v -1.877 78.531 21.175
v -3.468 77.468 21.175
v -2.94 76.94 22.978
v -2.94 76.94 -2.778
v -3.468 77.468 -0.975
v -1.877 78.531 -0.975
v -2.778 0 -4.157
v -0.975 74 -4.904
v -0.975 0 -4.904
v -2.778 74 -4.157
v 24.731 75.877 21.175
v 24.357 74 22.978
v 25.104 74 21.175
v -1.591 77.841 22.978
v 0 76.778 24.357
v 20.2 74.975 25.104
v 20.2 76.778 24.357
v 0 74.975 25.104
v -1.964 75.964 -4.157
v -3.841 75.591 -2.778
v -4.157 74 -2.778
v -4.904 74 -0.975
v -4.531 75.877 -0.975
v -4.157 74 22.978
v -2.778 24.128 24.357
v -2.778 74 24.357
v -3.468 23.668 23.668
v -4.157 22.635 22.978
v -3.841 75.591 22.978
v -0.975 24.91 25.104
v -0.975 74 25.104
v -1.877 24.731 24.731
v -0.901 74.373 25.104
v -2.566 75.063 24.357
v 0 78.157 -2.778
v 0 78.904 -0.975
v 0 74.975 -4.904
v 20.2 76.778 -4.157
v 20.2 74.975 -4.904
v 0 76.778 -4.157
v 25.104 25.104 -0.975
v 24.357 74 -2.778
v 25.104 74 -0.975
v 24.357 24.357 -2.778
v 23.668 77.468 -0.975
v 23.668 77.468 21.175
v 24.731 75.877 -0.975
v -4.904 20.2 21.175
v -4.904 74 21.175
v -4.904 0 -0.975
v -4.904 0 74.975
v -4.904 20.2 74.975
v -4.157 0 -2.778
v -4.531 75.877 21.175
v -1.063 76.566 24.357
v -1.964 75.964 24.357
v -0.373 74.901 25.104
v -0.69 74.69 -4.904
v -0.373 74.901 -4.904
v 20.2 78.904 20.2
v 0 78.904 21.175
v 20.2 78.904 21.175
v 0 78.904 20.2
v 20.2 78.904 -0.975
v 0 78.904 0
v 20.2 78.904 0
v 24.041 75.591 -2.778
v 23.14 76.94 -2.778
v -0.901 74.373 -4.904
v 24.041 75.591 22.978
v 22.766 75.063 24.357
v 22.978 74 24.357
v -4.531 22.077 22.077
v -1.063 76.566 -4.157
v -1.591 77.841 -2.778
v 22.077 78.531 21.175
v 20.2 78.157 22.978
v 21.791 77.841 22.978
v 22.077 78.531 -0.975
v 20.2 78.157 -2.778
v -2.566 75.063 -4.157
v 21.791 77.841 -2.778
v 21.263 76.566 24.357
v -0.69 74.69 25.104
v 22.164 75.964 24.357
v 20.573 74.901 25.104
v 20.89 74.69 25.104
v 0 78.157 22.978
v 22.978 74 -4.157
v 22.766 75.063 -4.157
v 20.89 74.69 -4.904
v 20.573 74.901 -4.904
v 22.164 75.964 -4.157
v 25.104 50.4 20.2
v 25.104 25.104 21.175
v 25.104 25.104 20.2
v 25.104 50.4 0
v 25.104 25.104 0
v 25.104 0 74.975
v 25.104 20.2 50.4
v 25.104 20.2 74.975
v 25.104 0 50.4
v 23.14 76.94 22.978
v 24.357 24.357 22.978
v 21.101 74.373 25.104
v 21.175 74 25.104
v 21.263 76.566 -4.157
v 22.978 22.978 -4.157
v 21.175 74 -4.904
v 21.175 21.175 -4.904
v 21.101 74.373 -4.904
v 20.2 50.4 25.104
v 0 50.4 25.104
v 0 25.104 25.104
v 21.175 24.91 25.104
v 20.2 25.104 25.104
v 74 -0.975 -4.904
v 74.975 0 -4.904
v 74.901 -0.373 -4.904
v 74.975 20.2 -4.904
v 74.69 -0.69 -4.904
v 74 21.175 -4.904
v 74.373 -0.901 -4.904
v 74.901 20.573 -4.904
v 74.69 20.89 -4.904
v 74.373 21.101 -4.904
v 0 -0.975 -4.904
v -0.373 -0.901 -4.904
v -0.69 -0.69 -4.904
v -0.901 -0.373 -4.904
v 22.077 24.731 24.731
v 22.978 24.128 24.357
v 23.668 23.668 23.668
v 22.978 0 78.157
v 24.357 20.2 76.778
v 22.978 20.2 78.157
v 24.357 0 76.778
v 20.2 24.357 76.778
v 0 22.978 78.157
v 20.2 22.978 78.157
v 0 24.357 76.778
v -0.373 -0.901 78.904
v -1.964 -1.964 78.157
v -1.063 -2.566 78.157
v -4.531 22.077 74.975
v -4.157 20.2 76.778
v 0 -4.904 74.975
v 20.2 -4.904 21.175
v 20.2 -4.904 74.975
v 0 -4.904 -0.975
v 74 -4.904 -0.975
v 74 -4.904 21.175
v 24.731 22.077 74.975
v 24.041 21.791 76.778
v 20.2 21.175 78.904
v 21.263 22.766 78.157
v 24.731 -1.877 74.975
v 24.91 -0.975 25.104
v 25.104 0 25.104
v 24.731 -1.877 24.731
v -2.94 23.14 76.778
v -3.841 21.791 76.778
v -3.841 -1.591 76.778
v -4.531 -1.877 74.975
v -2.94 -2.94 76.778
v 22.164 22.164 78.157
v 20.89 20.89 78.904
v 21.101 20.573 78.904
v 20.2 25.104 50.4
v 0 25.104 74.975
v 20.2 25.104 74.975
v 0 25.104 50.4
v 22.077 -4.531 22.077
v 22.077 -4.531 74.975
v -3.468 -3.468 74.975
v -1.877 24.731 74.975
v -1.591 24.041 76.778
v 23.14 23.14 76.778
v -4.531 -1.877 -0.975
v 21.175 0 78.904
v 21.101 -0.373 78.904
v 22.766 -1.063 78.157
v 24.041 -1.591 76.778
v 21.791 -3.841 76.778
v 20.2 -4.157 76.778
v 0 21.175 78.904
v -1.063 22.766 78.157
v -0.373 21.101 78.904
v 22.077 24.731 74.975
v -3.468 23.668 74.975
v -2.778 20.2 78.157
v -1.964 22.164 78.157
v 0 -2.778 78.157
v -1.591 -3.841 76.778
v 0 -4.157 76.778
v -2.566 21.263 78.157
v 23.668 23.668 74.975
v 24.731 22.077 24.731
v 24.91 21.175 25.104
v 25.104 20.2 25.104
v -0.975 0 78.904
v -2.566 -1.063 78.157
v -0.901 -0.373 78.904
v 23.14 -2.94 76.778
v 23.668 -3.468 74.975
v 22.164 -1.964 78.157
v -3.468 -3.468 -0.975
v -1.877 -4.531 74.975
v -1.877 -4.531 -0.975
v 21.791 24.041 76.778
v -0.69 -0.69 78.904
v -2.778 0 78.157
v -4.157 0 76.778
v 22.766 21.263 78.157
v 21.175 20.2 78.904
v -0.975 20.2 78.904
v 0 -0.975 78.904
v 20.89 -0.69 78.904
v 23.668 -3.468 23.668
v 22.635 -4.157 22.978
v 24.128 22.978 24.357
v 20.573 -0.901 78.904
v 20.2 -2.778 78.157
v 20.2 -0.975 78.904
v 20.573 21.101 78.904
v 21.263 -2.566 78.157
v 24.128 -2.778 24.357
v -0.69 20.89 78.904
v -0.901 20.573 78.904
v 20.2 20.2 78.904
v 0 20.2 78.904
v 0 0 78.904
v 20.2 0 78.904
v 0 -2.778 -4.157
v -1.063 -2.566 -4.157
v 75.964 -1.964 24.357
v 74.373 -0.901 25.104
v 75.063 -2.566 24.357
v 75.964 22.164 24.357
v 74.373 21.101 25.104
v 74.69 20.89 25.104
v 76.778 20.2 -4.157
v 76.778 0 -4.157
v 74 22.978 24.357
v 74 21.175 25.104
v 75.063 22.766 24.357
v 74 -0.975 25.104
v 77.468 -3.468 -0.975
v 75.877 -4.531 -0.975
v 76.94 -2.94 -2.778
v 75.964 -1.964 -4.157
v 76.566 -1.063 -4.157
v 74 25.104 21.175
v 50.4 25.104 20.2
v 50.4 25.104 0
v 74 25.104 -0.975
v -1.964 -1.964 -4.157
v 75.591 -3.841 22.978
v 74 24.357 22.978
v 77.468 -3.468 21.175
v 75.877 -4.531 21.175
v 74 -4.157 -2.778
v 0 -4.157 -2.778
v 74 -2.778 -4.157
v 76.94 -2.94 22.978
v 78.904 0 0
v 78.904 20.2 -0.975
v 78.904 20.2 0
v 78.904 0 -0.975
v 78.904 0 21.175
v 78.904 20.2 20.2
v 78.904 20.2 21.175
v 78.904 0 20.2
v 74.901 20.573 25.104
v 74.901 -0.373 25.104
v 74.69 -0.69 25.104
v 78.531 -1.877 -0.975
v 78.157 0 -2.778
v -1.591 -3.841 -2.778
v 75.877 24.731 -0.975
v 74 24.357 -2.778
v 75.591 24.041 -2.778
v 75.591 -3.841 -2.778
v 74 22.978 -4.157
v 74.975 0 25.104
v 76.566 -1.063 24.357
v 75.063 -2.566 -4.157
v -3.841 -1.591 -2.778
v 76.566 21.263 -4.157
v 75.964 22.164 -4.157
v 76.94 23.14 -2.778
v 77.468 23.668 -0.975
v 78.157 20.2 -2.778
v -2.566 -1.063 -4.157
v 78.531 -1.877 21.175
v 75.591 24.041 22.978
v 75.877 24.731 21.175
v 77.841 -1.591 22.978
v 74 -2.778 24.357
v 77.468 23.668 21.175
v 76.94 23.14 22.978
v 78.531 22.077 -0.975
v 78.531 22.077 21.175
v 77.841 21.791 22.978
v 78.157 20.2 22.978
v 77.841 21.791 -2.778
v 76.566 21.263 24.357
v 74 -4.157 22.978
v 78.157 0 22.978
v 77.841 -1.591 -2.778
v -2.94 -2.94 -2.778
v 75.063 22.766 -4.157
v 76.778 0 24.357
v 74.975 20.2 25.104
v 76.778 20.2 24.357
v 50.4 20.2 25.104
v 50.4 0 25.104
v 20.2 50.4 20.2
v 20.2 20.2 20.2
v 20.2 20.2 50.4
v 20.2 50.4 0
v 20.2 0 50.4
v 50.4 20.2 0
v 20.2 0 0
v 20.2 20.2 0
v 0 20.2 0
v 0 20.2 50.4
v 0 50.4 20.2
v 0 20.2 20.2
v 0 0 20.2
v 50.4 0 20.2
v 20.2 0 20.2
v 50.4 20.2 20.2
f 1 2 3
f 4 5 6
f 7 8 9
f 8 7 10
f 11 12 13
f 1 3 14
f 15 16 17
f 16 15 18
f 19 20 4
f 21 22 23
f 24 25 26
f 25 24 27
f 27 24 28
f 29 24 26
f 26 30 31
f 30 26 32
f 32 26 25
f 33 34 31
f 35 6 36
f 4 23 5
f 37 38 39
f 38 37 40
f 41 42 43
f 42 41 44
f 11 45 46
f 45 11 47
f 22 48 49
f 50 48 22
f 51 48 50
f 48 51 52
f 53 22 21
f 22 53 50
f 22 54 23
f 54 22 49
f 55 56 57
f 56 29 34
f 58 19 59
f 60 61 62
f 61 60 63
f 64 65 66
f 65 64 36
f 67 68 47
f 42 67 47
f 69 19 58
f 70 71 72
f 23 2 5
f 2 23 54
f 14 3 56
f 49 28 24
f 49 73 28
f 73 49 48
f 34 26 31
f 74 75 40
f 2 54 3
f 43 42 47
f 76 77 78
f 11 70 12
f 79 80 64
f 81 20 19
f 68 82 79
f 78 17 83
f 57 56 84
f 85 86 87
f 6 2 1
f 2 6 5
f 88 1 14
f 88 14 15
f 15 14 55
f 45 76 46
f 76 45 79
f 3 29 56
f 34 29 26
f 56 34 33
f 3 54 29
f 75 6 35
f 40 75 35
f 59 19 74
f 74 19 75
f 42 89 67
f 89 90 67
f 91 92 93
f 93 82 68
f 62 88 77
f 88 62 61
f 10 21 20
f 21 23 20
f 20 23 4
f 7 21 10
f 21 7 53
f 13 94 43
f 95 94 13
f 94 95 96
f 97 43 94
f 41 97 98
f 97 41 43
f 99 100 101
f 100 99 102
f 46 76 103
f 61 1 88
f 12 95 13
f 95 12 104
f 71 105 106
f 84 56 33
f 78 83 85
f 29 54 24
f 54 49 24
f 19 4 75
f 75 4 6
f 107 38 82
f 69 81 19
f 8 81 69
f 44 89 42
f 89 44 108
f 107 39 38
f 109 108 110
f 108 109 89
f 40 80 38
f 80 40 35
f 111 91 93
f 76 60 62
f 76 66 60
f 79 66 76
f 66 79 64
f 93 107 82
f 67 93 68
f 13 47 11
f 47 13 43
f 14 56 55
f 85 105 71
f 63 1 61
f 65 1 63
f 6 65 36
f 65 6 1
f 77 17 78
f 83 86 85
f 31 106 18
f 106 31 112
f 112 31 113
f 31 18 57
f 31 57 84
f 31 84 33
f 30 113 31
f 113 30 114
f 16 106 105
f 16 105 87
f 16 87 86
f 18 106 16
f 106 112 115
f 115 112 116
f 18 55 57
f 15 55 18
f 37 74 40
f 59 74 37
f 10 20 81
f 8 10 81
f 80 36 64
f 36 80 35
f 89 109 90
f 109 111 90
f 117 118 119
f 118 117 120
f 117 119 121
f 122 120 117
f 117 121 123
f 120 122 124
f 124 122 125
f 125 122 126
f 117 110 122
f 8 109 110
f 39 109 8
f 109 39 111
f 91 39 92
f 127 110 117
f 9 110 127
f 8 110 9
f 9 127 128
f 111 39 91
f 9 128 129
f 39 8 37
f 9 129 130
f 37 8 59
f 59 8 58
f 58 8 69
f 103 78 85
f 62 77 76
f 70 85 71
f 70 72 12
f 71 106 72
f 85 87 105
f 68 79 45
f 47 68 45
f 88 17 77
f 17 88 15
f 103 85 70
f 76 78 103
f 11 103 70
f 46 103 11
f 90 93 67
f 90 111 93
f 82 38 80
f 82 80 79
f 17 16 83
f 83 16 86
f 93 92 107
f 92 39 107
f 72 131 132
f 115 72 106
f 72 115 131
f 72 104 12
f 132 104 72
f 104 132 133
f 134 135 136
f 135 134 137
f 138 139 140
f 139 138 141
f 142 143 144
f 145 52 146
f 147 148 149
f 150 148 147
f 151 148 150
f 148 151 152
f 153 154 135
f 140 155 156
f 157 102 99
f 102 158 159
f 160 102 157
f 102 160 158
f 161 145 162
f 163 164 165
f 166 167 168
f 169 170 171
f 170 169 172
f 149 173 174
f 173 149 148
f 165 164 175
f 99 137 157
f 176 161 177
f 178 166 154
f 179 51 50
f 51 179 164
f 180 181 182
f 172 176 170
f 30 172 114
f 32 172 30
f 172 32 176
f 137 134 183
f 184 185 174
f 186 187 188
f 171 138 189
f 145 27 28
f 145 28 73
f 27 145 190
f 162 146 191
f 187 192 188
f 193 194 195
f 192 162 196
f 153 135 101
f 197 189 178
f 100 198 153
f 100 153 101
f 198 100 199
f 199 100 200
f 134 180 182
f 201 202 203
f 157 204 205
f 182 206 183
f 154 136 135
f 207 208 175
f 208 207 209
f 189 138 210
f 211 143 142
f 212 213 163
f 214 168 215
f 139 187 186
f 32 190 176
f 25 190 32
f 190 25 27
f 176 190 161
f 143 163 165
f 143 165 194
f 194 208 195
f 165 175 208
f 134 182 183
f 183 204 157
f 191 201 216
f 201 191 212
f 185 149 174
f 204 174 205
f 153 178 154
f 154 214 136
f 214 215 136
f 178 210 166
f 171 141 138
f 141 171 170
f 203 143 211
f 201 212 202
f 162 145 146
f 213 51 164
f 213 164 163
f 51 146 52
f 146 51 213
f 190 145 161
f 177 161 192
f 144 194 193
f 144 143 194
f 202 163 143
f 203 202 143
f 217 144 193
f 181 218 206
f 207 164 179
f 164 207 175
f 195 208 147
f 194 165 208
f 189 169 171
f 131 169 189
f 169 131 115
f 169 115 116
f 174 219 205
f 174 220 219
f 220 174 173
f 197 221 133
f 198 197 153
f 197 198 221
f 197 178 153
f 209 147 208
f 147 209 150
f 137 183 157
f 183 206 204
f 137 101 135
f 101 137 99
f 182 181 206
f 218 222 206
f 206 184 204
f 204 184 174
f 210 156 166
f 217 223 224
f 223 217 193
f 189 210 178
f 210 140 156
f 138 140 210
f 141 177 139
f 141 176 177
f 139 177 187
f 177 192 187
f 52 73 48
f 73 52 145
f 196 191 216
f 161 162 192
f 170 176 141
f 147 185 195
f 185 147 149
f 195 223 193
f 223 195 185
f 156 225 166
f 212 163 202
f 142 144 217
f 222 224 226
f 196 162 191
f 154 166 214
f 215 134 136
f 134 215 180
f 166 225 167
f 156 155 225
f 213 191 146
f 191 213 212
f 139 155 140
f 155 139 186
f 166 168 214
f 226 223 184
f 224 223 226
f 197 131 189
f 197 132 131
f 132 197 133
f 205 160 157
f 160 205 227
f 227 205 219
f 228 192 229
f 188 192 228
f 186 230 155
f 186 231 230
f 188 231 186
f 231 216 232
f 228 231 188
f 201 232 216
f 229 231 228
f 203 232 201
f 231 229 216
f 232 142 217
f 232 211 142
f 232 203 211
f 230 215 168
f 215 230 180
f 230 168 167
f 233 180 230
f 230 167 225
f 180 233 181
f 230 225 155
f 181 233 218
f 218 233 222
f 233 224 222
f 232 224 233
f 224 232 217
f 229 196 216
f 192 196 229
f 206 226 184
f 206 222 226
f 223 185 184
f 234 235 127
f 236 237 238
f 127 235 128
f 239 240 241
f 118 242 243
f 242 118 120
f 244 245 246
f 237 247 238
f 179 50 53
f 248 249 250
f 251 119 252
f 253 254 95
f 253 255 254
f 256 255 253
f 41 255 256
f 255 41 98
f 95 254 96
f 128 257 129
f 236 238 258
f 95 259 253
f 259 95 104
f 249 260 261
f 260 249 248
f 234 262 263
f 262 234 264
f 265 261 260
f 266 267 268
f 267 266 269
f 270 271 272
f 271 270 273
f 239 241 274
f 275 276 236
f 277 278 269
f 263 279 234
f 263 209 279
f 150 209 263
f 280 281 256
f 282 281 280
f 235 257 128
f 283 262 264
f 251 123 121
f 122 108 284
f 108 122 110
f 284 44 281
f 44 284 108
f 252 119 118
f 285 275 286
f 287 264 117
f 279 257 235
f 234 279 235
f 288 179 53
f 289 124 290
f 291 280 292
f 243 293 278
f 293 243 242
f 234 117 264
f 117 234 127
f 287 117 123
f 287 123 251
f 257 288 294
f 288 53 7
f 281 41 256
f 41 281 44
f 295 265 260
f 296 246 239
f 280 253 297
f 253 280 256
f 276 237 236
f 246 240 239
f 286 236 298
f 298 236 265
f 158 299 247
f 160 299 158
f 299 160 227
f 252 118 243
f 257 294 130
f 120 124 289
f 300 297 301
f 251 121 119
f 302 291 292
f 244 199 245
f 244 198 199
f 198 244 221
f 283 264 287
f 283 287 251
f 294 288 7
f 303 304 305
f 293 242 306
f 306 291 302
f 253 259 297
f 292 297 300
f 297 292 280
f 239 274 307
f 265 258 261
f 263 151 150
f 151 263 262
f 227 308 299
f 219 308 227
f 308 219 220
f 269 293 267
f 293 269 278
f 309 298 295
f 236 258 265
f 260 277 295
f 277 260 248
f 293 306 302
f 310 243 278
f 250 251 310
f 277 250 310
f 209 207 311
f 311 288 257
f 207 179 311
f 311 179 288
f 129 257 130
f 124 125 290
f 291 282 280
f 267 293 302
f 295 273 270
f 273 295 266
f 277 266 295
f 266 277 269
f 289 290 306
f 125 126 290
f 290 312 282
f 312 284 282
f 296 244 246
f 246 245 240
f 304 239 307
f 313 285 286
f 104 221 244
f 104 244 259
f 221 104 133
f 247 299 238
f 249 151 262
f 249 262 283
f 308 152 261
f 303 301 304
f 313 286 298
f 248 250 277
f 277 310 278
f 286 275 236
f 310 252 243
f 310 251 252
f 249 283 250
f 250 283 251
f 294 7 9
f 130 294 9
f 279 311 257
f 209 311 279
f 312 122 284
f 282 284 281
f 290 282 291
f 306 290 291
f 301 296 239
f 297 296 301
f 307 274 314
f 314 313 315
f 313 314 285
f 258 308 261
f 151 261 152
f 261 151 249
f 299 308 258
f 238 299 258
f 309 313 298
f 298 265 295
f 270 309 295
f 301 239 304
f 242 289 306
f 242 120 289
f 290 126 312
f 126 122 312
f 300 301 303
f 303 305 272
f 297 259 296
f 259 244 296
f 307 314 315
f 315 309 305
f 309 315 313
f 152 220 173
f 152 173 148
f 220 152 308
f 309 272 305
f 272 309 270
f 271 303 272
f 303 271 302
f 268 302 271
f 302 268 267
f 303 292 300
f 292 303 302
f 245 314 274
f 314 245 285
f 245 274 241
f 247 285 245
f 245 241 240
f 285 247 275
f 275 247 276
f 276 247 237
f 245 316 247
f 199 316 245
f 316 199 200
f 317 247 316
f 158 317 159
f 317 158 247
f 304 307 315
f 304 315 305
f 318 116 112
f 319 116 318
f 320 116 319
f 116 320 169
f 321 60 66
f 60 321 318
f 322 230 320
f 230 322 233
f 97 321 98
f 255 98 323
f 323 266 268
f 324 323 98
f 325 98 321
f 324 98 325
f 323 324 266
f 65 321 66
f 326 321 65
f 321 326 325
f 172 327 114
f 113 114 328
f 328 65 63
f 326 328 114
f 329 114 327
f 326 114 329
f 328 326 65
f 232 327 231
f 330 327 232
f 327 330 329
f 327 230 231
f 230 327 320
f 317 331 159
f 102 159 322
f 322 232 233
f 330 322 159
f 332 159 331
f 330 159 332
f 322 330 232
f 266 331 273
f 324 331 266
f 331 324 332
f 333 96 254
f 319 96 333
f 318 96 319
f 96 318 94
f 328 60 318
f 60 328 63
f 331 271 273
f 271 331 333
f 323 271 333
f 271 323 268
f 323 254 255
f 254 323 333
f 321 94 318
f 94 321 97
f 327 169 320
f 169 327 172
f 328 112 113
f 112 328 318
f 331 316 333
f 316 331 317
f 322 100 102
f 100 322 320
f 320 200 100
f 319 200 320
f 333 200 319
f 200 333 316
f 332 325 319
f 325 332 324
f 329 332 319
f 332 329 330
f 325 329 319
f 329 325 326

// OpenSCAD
difference(){
	minkowski(){
		union(){
			cube([20.2,20.2,74]);
			cube([20.2,74,20.2]);
			cube([74,20.2,20.2]);
		}
		sphere(5);
	}
	union(){
		cube([20.2,20.2,80]);
		cube([20.2,80,20.2]);
		cube([80,20.2,20.2]);
	}
	translate([20.2,20.2,0]){
		cube([30.2,30.2,20.2]);	
	}
	translate([0,20.2,20.2]){
		cube([20.2,30.2,30.2]);
	}
	translate([20.2,0,20.2]){
		cube([30.2,20.2,30.2]);
	}
}
cube(20.2);
